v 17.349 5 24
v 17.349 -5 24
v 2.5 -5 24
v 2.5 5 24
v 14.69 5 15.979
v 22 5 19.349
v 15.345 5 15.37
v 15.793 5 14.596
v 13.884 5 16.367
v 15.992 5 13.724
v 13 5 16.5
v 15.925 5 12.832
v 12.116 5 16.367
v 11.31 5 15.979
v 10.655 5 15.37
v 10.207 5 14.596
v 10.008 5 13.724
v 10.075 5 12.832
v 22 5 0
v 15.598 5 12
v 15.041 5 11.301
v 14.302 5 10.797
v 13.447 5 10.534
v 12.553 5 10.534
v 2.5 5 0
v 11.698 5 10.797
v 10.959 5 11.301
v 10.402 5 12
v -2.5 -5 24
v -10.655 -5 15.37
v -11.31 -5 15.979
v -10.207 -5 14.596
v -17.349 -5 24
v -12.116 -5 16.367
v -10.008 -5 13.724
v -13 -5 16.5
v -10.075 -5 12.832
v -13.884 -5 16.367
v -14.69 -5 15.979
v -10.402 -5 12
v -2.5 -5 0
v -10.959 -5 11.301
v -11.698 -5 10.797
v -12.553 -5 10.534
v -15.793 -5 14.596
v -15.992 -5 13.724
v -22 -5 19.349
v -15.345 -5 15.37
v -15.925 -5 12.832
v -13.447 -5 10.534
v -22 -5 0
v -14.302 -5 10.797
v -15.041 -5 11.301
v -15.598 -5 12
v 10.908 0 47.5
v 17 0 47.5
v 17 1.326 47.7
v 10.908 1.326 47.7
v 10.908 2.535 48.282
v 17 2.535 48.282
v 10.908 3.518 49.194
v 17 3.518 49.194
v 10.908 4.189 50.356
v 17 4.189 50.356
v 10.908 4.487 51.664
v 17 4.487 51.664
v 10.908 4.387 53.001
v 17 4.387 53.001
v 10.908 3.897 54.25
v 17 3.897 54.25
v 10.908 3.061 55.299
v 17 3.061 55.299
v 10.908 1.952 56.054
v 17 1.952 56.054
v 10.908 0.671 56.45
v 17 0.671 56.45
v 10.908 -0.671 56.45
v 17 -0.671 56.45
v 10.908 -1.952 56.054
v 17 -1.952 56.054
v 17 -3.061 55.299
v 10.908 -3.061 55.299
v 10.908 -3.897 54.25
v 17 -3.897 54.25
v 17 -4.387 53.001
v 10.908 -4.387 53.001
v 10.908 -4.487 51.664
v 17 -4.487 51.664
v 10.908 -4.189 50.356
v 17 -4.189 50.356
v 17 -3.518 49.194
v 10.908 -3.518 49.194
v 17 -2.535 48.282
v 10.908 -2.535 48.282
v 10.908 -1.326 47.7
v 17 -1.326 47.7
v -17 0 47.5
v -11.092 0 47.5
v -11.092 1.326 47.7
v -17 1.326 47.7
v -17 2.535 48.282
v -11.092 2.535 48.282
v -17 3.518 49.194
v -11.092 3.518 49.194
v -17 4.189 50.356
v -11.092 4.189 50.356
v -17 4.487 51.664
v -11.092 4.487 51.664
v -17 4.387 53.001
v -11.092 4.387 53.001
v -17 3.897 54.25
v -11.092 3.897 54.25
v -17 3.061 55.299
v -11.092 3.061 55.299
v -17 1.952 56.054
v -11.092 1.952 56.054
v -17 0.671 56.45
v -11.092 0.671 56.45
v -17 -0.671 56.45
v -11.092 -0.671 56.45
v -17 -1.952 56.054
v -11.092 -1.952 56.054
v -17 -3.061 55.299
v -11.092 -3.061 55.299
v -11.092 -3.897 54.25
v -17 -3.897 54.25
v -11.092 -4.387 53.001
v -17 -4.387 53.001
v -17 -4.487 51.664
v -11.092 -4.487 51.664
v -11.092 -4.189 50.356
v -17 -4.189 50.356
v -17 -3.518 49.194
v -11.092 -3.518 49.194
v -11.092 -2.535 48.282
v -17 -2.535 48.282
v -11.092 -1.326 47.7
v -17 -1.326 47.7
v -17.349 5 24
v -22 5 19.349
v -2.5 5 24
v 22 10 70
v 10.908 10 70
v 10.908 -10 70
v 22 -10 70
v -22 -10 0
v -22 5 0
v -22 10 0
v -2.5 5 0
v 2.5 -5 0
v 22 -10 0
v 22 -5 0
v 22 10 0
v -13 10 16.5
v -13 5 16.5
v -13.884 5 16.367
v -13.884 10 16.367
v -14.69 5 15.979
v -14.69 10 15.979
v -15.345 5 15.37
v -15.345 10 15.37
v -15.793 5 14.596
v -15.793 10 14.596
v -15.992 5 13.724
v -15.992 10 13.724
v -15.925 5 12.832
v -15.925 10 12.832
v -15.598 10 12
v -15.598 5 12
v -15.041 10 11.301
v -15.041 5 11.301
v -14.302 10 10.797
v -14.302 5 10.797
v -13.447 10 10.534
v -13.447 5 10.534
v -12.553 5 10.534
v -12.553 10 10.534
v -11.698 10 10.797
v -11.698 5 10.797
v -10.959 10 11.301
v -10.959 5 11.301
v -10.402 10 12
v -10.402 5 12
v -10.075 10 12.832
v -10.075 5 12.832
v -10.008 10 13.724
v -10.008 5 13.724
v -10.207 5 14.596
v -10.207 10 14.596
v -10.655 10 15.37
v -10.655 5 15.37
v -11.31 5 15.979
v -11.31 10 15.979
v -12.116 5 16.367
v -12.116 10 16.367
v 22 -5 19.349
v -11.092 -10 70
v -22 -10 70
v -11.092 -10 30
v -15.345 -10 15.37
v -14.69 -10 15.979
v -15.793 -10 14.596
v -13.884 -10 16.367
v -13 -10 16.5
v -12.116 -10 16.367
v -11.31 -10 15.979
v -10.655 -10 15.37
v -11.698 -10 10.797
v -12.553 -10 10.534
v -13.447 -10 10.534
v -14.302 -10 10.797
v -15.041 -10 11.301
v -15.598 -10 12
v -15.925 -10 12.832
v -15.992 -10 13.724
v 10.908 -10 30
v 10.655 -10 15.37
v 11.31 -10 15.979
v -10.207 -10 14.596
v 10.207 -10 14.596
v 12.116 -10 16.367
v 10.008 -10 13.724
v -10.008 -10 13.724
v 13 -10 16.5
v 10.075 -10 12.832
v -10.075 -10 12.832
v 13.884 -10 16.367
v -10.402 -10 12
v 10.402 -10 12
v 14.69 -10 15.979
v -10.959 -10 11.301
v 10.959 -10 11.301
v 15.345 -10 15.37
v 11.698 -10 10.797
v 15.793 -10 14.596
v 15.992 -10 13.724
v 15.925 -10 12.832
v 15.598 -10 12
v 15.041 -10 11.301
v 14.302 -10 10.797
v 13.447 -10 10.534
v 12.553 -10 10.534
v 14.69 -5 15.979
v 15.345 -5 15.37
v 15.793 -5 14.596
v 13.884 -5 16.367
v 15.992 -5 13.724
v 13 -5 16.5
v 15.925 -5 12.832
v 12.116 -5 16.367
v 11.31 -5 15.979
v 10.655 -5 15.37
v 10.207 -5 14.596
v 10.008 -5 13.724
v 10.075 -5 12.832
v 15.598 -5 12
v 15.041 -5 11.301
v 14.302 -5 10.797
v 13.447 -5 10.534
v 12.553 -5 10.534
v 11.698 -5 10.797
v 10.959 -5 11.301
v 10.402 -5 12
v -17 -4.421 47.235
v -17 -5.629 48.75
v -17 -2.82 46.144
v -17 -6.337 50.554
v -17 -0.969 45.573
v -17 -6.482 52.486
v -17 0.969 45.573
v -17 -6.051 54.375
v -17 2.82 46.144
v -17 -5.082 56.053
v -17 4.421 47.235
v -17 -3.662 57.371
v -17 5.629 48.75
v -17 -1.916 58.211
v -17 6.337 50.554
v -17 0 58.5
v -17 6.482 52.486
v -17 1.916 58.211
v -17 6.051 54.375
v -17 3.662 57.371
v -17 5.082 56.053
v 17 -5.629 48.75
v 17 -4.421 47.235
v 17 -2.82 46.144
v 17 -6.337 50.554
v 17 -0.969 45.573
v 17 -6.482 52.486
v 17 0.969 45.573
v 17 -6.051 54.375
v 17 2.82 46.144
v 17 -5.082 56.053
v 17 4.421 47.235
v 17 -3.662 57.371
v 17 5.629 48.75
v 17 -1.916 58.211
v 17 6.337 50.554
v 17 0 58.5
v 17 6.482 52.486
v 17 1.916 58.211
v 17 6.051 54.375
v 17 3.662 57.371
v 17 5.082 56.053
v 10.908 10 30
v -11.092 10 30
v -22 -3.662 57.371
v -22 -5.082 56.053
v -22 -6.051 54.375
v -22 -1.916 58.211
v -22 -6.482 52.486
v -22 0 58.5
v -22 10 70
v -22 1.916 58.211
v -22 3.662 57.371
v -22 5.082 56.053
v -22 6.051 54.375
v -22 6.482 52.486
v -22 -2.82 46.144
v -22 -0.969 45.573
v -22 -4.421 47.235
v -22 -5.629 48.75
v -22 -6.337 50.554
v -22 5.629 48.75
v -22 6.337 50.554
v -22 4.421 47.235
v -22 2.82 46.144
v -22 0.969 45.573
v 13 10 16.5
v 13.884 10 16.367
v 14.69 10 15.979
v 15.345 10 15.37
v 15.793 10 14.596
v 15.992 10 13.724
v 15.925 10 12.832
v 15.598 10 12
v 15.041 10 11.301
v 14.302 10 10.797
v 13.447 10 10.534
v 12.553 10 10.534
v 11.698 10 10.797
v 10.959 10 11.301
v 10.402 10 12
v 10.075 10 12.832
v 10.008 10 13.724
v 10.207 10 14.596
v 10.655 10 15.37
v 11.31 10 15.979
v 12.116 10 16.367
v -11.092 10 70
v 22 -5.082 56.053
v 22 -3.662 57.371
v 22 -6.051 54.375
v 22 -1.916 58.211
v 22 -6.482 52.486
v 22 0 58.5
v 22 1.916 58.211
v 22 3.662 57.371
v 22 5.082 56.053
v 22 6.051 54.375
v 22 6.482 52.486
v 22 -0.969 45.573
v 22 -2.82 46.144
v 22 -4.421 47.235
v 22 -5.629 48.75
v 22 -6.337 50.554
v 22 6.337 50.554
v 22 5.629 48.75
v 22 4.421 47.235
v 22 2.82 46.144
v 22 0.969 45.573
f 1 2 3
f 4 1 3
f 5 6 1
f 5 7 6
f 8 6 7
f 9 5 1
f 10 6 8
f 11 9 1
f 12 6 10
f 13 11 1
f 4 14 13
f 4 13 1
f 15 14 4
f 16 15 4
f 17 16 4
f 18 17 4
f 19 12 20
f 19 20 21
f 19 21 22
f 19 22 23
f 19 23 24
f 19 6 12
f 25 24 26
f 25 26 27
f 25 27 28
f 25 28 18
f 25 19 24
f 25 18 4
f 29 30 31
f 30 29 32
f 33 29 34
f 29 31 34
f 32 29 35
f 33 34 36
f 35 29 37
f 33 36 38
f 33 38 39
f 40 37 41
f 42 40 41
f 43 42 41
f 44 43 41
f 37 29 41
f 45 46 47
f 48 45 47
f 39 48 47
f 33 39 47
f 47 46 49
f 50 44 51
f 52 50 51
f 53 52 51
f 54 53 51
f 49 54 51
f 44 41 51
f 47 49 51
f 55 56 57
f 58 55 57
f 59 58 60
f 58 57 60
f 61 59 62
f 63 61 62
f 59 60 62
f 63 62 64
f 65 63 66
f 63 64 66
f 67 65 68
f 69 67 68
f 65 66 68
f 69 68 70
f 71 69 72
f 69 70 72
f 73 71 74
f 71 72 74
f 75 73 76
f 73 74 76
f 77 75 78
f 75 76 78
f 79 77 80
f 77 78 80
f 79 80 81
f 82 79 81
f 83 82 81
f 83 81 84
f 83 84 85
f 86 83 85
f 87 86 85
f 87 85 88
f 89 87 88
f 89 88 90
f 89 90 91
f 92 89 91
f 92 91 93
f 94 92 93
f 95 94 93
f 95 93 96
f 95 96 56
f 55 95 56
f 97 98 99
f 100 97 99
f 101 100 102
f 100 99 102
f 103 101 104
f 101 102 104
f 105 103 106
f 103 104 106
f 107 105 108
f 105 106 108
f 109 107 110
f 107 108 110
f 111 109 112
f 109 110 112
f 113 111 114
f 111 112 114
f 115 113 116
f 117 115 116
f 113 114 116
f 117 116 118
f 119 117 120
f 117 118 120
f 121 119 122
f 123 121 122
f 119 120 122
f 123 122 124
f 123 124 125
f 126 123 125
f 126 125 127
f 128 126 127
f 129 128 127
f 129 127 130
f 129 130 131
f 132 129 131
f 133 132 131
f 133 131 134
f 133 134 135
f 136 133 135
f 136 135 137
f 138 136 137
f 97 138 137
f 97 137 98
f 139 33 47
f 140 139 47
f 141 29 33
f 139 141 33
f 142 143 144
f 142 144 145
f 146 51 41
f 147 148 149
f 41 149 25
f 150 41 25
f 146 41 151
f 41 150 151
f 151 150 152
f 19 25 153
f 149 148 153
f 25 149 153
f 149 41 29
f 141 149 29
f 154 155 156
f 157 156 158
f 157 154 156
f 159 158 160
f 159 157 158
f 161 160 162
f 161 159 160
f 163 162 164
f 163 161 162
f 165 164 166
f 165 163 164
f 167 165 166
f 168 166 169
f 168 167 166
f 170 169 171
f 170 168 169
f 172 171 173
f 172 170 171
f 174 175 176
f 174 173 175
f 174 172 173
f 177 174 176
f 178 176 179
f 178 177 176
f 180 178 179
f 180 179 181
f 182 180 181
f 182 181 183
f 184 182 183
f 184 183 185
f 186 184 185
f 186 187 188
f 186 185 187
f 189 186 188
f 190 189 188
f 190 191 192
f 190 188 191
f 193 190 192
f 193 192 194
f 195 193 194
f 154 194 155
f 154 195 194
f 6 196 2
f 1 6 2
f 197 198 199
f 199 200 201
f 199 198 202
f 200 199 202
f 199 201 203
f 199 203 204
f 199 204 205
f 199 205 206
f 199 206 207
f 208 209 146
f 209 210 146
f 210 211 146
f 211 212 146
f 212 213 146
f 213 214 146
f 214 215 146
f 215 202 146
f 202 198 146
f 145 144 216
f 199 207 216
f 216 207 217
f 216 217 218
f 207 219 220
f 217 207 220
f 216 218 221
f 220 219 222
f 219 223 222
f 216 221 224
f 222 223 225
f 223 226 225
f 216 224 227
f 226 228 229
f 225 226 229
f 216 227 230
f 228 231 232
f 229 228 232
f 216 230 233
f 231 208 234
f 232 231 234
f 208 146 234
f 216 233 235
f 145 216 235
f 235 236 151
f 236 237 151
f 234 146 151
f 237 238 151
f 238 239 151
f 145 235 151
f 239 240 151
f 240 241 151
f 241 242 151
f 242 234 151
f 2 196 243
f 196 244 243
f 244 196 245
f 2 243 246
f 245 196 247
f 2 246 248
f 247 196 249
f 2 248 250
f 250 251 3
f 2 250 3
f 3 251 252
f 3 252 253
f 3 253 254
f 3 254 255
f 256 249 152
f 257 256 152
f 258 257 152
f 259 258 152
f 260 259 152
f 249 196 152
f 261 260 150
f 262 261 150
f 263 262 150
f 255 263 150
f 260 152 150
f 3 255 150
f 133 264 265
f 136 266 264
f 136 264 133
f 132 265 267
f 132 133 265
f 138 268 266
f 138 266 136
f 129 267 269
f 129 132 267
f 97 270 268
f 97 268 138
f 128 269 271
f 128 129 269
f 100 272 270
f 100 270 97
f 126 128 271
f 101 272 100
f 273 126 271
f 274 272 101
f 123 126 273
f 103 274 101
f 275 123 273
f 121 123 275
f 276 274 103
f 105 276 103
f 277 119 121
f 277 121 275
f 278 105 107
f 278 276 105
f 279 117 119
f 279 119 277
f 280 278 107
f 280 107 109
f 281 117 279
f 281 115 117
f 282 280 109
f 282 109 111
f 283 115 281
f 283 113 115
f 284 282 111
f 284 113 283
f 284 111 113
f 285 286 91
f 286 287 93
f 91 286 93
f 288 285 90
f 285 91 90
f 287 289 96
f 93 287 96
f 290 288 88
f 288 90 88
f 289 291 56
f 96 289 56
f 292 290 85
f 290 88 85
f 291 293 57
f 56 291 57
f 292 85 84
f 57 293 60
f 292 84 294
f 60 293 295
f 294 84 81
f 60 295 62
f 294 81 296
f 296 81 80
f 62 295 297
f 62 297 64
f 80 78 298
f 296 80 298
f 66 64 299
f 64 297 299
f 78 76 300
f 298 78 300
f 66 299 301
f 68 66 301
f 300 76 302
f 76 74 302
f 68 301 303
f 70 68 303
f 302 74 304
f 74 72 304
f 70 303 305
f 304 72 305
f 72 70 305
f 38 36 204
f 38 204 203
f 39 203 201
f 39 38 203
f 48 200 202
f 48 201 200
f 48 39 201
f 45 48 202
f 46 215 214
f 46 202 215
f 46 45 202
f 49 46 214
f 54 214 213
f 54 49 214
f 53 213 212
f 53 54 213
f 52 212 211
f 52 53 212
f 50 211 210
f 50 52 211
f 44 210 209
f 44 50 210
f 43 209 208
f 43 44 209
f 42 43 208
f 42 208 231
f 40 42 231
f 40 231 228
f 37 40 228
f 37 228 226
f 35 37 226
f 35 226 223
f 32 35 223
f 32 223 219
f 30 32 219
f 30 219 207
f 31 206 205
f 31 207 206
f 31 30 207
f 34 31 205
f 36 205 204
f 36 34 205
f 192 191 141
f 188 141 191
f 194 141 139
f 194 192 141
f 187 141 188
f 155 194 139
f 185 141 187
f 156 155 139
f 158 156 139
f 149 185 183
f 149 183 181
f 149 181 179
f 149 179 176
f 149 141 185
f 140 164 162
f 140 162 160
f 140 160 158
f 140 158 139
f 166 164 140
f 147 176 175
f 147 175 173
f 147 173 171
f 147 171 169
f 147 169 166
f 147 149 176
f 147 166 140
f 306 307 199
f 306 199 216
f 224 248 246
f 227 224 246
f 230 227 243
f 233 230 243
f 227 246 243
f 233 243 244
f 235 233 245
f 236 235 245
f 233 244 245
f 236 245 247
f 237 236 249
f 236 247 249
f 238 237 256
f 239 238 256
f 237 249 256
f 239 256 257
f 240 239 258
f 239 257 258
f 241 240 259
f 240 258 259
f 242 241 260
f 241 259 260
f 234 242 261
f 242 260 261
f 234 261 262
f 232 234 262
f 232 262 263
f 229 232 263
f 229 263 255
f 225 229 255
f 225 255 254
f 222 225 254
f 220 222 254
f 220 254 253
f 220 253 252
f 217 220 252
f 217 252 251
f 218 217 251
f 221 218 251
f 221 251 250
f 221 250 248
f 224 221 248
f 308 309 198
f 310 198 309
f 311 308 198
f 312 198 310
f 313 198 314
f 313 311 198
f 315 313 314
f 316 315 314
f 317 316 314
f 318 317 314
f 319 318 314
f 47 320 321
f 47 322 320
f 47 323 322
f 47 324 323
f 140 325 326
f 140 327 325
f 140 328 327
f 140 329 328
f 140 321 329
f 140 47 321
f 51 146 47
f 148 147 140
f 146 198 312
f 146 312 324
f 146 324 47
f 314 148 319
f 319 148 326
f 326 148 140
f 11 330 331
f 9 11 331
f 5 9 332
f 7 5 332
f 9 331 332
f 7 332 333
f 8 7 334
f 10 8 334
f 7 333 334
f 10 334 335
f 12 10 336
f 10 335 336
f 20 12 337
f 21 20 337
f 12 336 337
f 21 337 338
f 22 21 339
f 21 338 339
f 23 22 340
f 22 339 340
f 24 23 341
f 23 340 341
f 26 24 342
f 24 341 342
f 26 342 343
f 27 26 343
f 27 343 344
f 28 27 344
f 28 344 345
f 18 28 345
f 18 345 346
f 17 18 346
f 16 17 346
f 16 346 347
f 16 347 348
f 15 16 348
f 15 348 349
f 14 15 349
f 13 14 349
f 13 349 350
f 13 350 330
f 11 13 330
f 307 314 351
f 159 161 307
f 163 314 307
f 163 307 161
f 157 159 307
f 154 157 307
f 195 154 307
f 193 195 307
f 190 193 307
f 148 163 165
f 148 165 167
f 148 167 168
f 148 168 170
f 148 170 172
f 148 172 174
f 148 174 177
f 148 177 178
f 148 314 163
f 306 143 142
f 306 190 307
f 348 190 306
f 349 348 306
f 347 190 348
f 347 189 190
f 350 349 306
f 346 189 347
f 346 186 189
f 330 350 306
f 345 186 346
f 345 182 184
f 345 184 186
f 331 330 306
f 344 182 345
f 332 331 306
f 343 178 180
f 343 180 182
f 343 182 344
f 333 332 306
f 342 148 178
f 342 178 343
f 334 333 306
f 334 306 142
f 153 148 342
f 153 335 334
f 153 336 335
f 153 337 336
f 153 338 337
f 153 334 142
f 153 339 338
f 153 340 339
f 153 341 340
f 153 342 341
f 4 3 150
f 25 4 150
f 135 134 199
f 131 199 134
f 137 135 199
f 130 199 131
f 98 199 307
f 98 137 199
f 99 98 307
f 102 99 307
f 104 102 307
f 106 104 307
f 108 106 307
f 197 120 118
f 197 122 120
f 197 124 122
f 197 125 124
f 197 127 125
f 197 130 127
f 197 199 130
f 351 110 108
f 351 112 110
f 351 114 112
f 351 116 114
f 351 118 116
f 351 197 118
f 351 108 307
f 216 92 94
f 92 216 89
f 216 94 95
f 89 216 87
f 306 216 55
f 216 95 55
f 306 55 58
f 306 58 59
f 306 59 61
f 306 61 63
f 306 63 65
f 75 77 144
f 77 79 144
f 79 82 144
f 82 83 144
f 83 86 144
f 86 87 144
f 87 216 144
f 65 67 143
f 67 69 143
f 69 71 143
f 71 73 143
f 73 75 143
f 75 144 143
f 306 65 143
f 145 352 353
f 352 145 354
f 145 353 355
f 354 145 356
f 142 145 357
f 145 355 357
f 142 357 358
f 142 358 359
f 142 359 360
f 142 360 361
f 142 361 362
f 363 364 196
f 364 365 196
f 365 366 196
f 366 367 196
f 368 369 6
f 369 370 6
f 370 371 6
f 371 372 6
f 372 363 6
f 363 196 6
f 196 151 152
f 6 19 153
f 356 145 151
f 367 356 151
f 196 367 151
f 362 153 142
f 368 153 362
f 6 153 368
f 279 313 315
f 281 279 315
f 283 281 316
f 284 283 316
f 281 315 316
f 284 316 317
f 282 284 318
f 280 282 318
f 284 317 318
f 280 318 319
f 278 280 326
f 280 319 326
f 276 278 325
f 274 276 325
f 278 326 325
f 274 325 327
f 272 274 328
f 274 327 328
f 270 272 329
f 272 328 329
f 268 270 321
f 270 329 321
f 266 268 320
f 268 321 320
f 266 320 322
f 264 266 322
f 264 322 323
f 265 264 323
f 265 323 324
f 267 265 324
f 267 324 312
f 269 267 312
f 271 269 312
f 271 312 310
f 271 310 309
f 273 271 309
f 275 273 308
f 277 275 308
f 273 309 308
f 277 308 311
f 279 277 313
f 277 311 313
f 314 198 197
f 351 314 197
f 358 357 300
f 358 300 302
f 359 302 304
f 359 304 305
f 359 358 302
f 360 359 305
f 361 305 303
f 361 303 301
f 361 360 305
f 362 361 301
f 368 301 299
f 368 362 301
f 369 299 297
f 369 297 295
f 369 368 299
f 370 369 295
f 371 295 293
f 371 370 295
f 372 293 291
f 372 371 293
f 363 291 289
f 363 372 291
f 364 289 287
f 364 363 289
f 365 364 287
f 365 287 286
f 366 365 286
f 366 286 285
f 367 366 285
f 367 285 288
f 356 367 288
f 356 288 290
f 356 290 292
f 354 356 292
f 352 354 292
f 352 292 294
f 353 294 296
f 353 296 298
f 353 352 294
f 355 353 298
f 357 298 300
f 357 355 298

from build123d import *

# Parameters (mm, degrees)
SKETCH_1_W               = 44
SKETCH_1_H               = 20
EXTRUDE_1_DEPTH          = 70
SKETCH_2_W               = 22
SKETCH_2_H               = 20
CUT_EXTRUDE_1_DEPTH      = 40
SKETCH_3_R               = 4.5
CUT_EXTRUDE_2_DEPTH      = 50
SKETCH_4_R               = 6.5
CUT_EXTRUDE_4_DEPTH      = 5
SKETCH_5_R               = 3
CUT_EXTRUDE_5_DEPTH      = 29
CUT_EXTRUDE_6_DEPTH      = 5
CUT_EXTRUDE_6_DEPTH_BACK = 5


with BuildPart() as part:
    # 스케치1 → 보스-돌출1 (new body)
    with BuildSketch(Plane.XY):
        Rectangle(SKETCH_1_W, SKETCH_1_H)
    extrude(amount=EXTRUDE_1_DEPTH)

    # 스케치2 → 컷-돌출1 (cut)
    with BuildSketch(Plane.XY.offset(70)):
        with Locations((-0.092136373, 0)):
            Rectangle(SKETCH_2_W, SKETCH_2_H)
    extrude(amount=-CUT_EXTRUDE_1_DEPTH, mode=Mode.SUBTRACT)

    # 스케치3 → 컷-돌출2 (cut)
    with BuildSketch(Plane(origin=(22, 0, 0), x_dir=(0, 0, -1), z_dir=(1, 0, 0))):
        with Locations((-52, 0)):
            Circle(SKETCH_3_R)
    extrude(amount=-CUT_EXTRUDE_2_DEPTH, mode=Mode.SUBTRACT)

    # 스케치4 → 컷-돌출4 (cut)
    with BuildSketch(Plane.ZY.offset(-22)):
        with Locations((52, 0)):
            Circle(SKETCH_4_R)
    cut_extrude_4 = extrude(amount=CUT_EXTRUDE_4_DEPTH, mode=Mode.SUBTRACT)

    # 스케치5 → 컷-돌출5 (cut)
    with BuildSketch(Plane(origin=(0, 10, 0), x_dir=(1, 0, 0), z_dir=(0, 1, 0))):
        with Locations((13, -13.5)):
            Circle(SKETCH_5_R)
    cut_extrude_5 = extrude(amount=-CUT_EXTRUDE_5_DEPTH, mode=Mode.SUBTRACT)

    # 대칭 복사2: 컷-돌출4, 컷-돌출5 across plane
    add(cut_extrude_4.mirror(Plane(origin=(0, 0, 0), x_dir=(0, 0, 1), z_dir=(1, 0, 0))), mode=Mode.SUBTRACT)
    add(cut_extrude_5.mirror(Plane(origin=(0, 0, 0), x_dir=(0, 0, 1), z_dir=(1, 0, 0))), mode=Mode.SUBTRACT)

    # 스케치6 → 컷-돌출6 (cut, two sides: drawn at the far end of the back side and taken through both)
    with BuildSketch(Plane(origin=(0, 0, 0), x_dir=(1, 0, 0), z_dir=(0, 1, 0)).offset(-CUT_EXTRUDE_6_DEPTH_BACK)):
        Polygon((2.5, -24), (2.5, 0), (22, 0), (22, -19.349242405), (17.349242405, -24), align=None)
        Polygon((-22, -19.349242405), (-22, 0), (-2.5, 0), (-2.5, -24), (-17.349242405, -24), align=None)
    extrude(amount=CUT_EXTRUDE_6_DEPTH + CUT_EXTRUDE_6_DEPTH_BACK, mode=Mode.SUBTRACT)


solid = part.part
